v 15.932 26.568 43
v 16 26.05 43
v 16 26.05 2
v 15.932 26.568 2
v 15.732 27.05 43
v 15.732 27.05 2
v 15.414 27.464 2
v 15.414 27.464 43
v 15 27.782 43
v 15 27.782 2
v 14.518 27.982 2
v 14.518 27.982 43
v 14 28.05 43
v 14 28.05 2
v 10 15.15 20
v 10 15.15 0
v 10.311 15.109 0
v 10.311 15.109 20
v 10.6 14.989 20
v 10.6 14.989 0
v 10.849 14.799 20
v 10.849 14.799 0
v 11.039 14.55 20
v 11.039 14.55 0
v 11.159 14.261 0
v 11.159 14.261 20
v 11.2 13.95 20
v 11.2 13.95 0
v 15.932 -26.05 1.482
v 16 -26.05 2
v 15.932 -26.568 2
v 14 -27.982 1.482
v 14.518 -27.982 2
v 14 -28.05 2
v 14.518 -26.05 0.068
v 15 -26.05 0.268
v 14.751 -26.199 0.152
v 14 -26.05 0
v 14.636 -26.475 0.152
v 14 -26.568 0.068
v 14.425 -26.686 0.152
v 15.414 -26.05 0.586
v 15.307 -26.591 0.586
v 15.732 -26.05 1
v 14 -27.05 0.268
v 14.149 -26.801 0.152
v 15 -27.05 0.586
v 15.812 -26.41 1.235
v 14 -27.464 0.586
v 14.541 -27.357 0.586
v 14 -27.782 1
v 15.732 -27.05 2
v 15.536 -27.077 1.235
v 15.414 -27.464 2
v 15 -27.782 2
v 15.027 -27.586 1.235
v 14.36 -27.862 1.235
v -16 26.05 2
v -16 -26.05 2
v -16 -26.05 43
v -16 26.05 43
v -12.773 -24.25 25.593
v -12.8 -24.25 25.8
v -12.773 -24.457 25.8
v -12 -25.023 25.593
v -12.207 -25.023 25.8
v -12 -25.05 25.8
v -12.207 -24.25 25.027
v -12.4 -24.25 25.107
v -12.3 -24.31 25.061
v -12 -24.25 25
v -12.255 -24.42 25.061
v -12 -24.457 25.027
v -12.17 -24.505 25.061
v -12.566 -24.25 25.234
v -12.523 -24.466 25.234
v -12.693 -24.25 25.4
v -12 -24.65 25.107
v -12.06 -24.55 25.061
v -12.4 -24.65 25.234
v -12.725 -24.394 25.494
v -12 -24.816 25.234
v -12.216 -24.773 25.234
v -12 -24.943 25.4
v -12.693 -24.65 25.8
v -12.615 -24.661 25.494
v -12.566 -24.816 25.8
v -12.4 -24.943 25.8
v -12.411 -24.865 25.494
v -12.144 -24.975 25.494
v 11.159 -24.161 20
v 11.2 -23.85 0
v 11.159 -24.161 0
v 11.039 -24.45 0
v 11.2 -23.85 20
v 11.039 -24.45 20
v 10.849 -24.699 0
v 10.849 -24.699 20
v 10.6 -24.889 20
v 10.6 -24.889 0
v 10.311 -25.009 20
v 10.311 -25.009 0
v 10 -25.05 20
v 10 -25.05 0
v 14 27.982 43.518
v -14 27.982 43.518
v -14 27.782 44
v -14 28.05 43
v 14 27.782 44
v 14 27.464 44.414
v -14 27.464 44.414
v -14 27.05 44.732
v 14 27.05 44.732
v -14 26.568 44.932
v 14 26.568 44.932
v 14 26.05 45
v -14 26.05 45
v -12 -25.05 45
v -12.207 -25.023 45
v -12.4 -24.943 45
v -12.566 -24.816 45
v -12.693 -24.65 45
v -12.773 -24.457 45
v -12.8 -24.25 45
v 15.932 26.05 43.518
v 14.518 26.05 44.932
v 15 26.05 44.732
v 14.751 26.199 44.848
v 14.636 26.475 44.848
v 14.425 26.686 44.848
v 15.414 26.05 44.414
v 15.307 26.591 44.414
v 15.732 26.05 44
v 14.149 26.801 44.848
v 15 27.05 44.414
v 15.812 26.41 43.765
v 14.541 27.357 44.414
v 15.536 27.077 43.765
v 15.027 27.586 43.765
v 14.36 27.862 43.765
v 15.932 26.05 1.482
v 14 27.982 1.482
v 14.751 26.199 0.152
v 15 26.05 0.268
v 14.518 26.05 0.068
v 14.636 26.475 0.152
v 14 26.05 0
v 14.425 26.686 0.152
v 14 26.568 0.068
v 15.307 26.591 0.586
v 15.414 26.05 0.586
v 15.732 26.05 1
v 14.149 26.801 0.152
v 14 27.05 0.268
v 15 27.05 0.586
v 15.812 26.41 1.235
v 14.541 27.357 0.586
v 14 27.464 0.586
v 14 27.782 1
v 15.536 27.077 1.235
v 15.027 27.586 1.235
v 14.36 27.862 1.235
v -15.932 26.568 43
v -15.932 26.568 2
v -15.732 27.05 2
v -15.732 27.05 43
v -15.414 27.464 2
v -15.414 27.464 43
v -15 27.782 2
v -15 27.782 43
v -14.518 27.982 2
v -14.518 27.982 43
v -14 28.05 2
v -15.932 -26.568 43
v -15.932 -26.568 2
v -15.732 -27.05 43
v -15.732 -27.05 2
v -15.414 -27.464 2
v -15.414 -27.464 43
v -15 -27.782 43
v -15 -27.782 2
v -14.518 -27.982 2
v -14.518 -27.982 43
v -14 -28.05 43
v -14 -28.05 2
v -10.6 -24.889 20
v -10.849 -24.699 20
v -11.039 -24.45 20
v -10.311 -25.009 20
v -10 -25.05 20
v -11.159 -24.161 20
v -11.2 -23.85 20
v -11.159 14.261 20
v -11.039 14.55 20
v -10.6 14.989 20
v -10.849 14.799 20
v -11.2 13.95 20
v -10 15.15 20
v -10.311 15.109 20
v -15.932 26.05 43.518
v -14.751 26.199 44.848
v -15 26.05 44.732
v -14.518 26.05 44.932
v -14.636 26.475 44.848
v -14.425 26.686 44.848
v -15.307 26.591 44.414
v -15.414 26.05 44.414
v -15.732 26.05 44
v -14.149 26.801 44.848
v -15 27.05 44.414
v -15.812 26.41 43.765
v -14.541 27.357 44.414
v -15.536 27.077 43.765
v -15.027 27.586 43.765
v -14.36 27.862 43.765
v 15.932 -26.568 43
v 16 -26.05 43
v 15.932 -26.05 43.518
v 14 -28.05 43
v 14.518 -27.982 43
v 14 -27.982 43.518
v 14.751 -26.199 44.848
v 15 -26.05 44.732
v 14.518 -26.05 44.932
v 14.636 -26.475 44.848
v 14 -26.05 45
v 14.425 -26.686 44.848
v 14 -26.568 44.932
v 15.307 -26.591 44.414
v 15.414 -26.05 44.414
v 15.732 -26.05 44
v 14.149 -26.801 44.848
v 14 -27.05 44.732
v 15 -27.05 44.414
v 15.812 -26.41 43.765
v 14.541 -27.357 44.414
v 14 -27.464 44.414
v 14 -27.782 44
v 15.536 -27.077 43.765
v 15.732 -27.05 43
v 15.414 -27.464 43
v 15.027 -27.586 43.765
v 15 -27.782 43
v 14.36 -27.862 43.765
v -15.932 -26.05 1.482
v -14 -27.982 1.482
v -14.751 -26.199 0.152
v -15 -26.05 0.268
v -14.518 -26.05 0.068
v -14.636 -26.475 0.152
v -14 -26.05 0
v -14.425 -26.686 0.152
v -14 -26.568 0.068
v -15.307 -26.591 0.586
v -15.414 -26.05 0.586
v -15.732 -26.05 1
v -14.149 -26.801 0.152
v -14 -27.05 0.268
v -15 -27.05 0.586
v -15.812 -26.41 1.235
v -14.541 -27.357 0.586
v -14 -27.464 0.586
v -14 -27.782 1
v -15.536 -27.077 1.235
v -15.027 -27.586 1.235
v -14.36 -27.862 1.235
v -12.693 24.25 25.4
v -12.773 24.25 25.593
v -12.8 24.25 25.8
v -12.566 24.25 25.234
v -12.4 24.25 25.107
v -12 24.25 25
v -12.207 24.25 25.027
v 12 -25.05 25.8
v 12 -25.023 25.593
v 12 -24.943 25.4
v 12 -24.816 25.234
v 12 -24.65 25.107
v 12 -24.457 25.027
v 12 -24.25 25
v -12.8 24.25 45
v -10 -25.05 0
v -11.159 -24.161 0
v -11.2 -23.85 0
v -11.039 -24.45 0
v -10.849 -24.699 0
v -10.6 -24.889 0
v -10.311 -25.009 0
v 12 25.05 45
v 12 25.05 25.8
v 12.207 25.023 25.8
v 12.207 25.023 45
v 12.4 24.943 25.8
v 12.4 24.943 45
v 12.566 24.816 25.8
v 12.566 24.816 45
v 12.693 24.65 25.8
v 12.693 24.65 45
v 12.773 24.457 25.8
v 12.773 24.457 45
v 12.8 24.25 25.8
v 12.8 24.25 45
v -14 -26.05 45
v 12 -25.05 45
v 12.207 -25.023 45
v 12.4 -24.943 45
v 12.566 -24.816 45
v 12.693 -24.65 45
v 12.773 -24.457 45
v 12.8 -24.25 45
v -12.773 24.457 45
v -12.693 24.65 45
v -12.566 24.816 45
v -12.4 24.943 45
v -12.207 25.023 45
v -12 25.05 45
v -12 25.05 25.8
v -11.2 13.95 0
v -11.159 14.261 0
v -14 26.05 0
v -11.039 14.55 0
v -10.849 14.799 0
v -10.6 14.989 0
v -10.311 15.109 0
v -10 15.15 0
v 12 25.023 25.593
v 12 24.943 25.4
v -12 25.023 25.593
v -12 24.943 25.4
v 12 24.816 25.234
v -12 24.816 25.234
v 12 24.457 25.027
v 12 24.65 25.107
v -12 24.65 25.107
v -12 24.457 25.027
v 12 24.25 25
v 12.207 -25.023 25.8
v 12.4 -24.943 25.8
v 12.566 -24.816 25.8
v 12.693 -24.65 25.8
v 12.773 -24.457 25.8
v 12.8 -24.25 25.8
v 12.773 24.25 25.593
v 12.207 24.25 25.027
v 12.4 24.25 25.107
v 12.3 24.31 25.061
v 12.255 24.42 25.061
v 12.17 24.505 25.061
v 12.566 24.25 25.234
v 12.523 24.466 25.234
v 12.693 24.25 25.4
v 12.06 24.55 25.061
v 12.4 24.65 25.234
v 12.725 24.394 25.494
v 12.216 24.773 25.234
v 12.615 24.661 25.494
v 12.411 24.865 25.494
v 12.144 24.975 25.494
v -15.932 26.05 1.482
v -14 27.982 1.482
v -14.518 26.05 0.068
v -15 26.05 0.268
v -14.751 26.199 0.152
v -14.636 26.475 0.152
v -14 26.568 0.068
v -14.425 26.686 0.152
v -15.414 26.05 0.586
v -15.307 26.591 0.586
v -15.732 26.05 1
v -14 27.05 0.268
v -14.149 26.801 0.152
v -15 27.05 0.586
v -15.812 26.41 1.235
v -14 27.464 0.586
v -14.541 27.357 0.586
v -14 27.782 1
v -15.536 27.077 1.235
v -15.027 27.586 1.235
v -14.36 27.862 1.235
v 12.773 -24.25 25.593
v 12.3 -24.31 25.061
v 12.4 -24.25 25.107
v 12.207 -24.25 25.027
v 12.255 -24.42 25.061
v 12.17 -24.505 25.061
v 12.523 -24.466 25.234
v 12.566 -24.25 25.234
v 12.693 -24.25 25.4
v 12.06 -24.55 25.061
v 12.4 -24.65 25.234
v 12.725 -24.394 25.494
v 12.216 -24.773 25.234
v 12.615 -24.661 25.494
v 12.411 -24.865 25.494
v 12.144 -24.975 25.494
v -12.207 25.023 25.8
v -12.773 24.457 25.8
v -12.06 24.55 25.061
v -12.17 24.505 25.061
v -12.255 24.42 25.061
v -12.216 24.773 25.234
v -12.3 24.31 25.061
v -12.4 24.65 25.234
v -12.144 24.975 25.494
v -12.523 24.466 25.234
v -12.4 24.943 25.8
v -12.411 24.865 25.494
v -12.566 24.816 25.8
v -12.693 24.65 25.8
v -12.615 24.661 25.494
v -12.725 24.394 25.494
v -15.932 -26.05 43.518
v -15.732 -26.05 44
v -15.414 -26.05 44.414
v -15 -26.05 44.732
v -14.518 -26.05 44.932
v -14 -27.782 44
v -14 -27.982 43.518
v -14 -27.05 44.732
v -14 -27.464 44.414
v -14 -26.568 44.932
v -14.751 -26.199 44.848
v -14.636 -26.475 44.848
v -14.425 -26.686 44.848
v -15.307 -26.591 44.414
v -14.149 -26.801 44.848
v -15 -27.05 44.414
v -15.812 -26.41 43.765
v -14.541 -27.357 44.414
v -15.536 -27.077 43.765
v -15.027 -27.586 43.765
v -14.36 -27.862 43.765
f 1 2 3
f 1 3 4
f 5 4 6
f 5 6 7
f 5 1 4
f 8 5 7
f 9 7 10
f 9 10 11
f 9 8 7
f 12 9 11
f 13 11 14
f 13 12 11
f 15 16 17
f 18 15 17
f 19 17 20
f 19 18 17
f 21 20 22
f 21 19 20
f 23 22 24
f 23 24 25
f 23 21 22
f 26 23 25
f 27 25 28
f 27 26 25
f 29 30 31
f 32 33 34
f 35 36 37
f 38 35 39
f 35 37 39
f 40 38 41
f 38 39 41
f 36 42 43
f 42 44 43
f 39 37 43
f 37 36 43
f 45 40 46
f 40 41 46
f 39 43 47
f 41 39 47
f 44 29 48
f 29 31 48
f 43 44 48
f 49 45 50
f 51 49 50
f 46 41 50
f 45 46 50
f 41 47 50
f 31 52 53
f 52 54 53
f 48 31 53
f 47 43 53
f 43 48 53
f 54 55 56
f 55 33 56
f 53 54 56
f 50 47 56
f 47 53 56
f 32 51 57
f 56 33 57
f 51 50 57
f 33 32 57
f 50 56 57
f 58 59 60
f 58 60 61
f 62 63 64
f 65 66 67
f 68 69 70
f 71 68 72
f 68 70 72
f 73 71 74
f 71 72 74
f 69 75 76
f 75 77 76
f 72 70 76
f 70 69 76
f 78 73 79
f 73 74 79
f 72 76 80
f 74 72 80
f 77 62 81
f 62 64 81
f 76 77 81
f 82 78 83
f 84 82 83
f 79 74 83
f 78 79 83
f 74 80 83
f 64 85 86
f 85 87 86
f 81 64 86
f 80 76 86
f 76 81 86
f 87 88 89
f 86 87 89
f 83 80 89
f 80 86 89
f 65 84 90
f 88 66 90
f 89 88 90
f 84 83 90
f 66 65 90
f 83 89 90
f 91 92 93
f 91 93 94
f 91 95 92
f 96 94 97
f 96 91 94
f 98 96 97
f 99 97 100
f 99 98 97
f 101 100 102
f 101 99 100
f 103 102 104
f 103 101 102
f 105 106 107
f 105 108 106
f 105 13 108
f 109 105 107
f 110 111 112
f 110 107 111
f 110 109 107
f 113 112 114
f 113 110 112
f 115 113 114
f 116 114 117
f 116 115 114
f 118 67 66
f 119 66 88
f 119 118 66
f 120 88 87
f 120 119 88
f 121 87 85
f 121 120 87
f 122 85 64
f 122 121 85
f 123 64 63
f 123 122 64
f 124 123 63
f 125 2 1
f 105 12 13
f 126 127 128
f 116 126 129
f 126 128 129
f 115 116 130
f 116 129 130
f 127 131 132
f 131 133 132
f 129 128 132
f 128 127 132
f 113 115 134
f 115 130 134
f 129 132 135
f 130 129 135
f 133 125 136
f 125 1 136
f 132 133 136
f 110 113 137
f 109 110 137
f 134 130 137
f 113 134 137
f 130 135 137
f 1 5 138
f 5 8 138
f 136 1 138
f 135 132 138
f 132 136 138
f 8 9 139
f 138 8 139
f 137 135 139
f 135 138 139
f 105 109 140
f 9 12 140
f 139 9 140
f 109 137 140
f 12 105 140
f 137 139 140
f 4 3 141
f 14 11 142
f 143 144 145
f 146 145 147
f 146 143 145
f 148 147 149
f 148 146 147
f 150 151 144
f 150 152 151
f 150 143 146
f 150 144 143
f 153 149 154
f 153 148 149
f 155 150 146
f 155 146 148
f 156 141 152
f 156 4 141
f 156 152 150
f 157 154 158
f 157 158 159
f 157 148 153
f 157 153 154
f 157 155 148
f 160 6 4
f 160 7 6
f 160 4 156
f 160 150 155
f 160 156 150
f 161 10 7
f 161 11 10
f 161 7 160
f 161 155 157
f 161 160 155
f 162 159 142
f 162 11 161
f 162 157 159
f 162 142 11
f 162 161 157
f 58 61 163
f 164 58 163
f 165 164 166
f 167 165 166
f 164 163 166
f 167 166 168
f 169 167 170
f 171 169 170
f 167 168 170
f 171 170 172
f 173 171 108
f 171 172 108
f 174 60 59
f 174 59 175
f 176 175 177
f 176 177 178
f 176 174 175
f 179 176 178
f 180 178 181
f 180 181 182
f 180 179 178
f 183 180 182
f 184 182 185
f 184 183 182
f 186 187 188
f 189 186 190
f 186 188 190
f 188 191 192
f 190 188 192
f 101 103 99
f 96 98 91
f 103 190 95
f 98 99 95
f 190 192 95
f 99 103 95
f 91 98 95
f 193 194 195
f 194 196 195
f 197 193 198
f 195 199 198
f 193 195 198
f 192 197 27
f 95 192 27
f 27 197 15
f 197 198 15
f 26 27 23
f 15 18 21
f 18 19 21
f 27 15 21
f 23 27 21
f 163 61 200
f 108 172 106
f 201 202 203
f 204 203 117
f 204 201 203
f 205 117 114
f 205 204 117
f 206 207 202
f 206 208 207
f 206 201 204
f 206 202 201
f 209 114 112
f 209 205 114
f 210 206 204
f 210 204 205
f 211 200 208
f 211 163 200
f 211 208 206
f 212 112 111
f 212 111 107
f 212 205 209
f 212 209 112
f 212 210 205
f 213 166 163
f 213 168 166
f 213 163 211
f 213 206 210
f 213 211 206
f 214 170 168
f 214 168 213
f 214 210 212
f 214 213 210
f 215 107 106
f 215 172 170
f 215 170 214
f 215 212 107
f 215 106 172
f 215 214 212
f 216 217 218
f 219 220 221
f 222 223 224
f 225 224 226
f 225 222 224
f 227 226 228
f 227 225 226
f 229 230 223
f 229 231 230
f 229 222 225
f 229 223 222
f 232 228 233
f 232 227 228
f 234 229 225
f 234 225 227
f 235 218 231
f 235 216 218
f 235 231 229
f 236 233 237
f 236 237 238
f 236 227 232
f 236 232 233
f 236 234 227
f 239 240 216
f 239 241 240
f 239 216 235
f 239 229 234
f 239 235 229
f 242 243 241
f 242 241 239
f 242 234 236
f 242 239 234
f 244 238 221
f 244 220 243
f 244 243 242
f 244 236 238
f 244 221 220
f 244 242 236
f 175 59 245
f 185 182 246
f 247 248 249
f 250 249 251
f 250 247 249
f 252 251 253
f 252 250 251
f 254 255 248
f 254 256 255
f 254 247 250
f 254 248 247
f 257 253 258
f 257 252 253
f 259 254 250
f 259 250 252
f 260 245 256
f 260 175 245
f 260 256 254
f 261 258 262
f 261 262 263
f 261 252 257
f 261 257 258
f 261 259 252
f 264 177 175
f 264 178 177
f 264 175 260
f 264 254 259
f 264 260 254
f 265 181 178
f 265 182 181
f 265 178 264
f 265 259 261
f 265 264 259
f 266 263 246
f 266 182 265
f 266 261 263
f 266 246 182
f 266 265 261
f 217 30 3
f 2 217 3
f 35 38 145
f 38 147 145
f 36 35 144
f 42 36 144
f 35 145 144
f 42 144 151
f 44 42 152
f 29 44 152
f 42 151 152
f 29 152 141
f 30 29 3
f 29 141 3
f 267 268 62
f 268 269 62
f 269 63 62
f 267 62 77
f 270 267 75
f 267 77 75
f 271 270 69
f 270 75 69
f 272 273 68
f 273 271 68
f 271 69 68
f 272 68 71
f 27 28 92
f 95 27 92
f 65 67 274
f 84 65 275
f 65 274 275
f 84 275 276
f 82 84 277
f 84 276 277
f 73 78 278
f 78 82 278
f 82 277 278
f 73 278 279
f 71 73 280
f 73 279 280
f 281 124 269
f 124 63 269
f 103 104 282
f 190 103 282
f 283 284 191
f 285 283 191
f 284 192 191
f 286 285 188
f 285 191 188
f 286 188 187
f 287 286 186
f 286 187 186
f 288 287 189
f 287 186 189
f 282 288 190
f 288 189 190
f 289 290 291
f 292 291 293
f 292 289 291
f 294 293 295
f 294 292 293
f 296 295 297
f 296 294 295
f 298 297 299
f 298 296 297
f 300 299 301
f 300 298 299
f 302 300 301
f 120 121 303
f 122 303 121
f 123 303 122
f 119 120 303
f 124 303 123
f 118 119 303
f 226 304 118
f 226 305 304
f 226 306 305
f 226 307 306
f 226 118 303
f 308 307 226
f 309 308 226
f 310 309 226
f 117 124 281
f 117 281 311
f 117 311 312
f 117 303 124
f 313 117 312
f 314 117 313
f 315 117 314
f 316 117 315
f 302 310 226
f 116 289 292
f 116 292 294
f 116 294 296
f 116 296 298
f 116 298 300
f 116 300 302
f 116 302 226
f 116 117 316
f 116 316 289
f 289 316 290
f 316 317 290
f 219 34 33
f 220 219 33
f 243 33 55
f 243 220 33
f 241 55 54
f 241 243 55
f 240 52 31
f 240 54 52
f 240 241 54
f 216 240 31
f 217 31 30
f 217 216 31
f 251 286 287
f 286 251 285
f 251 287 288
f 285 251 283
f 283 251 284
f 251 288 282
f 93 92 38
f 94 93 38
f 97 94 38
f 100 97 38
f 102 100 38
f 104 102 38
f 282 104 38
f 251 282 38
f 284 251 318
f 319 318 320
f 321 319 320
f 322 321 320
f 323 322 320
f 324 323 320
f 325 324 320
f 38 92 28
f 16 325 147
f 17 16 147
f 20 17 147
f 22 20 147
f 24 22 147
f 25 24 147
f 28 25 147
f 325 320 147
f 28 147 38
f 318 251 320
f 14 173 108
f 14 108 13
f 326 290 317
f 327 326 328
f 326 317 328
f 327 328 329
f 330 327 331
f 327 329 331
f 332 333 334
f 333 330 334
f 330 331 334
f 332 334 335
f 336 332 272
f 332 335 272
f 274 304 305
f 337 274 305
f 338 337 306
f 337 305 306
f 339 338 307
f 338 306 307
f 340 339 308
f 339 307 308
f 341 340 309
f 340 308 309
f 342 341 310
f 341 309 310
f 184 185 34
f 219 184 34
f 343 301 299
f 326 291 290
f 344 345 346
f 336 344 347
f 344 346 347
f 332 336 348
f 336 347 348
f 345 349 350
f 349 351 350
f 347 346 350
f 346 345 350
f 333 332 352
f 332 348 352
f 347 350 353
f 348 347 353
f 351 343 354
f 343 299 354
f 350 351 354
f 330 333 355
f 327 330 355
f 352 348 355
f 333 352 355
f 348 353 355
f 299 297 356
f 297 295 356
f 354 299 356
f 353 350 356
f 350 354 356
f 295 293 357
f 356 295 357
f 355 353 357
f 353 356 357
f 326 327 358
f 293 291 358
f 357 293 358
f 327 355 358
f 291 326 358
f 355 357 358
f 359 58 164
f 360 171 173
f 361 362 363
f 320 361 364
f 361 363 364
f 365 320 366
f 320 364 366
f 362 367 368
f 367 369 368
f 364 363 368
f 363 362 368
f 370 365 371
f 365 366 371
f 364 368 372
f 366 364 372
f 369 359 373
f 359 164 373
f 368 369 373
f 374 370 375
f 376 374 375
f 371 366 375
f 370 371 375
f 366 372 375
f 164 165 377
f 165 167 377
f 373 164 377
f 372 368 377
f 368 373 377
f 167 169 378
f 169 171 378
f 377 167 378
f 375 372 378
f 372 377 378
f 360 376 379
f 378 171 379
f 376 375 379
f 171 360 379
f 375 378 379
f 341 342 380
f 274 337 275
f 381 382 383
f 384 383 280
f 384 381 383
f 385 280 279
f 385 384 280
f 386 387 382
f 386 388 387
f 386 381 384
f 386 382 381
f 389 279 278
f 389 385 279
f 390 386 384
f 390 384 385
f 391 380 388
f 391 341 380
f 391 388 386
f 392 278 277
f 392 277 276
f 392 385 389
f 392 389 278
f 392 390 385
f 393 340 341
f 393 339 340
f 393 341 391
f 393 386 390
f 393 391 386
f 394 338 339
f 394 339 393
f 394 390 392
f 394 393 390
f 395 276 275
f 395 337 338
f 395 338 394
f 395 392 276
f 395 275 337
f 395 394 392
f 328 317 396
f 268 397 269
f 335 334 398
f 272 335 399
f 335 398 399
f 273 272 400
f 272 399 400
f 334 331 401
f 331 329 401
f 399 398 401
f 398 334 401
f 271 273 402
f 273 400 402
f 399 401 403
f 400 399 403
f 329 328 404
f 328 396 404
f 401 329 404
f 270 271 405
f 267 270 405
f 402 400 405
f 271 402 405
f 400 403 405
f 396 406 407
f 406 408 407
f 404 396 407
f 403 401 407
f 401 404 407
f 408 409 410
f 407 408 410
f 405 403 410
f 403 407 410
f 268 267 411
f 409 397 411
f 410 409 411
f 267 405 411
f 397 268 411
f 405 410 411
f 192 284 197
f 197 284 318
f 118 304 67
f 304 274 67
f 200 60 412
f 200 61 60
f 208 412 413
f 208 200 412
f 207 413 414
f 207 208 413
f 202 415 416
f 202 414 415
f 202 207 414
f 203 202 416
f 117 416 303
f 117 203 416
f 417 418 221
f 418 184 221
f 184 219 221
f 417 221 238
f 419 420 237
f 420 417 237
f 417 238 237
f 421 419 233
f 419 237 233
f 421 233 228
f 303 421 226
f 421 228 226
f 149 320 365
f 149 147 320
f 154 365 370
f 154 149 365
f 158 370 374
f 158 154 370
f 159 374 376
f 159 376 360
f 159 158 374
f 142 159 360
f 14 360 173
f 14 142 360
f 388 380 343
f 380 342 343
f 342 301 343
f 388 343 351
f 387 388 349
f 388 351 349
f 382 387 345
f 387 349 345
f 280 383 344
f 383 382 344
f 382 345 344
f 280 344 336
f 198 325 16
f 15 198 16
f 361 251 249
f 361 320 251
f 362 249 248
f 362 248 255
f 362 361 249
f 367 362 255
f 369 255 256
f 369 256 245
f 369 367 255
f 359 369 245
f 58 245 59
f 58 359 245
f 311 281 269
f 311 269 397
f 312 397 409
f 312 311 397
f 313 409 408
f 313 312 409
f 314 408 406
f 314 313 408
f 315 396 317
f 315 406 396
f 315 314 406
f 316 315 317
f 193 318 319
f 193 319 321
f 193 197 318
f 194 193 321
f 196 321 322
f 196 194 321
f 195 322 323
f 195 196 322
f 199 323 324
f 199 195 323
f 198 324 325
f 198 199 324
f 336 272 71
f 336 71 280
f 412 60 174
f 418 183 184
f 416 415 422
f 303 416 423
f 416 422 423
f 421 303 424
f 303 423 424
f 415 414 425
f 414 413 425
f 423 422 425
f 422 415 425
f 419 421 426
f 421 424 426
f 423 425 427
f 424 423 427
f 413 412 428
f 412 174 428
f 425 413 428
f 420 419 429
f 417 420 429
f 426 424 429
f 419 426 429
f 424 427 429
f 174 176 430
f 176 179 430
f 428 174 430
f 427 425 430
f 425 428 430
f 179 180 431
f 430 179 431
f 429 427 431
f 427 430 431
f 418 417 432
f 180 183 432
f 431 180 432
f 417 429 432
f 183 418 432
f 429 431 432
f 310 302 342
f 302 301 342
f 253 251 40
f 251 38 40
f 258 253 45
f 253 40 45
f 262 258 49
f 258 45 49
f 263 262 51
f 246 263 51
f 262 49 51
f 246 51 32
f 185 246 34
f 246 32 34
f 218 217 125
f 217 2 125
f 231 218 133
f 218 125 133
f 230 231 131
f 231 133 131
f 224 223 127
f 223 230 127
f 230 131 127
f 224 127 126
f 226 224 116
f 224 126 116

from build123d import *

# Parameters (mm, degrees)
F0_W     = 22.4
F0_H     = 40.2
F1_DEPTH = 25
F2_DEPTH = 20
F0_W_2   = 32
F0_H_2   = 56.1
F3_DEPTH = 45
F4_DEPTH = 20
F5_R     = 2
F6_R     = 0.8
F7_R     = 1.2


with BuildPart() as f1:
    # F0 (on Top) → F1 (new body)
    with BuildSketch(Plane.XY):
        Polygon((-11.2, -25.05), (-11.2, 15.15), (11.2, 15.15), (11.2, -25.05), (12.8, -25.05), (12.8, 25.05), (-12.8, 25.05), (-12.8, -25.05), align=None)
        with Locations((0, -4.95)):
            Rectangle(F0_W, F0_H)
    extrude(amount=F1_DEPTH)

    # F0 (on Top) → F2 (cut)
    with BuildSketch(Plane.XY):
        with Locations((0, -4.95)):
            Rectangle(F0_W, F0_H)
        Polygon((-11.2, -25.05), (-11.2, 15.15), (11.2, 15.15), (11.2, -25.05), (12.8, -25.05), (12.8, 25.05), (-12.8, 25.05), (-12.8, -25.05), align=None)
    extrude(amount=F2_DEPTH, mode=Mode.SUBTRACT)

    # F0 (on Top) → F3 (join)
    with BuildSketch(Plane.XY):
        Rectangle(F0_W_2, F0_H_2)
        Polygon((11.2, -25.05), (-11.2, -25.05), (-12.8, -25.05), (-12.8, 25.05), (12.8, 25.05), (12.8, -25.05), align=None, mode=Mode.SUBTRACT)
    extrude(amount=F3_DEPTH)

    # F0 (on Top) → F4 (join)
    with BuildSketch(Plane.XY):
        Polygon((-11.2, -25.05), (-11.2, 15.15), (11.2, 15.15), (11.2, -25.05), (12.8, -25.05), (12.8, 25.05), (-12.8, 25.05), (-12.8, -25.05), align=None)
    extrude(amount=F4_DEPTH)

    # F5
    f5_edges = [f1.edges().sort_by_distance(p)[0] for p in [
        (16, -28.05, 22.5),
        (16, 28.05, 22.5),
        (16, 0, 0),
        (16, 0, 45),
        (-16, 28.05, 22.5),
        (-16, -28.05, 22.5),
        (-16, 0, 0),
        (-16, 0, 45),
        (0, 28.05, 0),
        (0, 28.05, 45),
        (0, -28.05, 0),
        (0, -28.05, 45),
    ]]
    fillet(f5_edges, radius=F5_R)

    # F6
    f6_edges = [f1.edges().sort_by_distance(p)[0] for p in [
        (12.8, 25.05, 35),
        (12.8, -25.05, 35),
        (-12.8, -25.05, 35),
        (-12.8, 25.05, 35),
        (12.8, 0, 25),
        (0, 25.05, 25),
        (-12.8, 0, 25),
        (0, -25.05, 25),
    ]]
    fillet(f6_edges, radius=F6_R)

    # F7
    f7_edges = [f1.edges().sort_by_distance(p)[0] for p in [
        (-11.2, -25.05, 10),
        (11.2, -25.05, 10),
        (11.2, 15.15, 10),
        (-11.2, 15.15, 10),
    ]]
    fillet(f7_edges, radius=F7_R)


solid = f1.part
